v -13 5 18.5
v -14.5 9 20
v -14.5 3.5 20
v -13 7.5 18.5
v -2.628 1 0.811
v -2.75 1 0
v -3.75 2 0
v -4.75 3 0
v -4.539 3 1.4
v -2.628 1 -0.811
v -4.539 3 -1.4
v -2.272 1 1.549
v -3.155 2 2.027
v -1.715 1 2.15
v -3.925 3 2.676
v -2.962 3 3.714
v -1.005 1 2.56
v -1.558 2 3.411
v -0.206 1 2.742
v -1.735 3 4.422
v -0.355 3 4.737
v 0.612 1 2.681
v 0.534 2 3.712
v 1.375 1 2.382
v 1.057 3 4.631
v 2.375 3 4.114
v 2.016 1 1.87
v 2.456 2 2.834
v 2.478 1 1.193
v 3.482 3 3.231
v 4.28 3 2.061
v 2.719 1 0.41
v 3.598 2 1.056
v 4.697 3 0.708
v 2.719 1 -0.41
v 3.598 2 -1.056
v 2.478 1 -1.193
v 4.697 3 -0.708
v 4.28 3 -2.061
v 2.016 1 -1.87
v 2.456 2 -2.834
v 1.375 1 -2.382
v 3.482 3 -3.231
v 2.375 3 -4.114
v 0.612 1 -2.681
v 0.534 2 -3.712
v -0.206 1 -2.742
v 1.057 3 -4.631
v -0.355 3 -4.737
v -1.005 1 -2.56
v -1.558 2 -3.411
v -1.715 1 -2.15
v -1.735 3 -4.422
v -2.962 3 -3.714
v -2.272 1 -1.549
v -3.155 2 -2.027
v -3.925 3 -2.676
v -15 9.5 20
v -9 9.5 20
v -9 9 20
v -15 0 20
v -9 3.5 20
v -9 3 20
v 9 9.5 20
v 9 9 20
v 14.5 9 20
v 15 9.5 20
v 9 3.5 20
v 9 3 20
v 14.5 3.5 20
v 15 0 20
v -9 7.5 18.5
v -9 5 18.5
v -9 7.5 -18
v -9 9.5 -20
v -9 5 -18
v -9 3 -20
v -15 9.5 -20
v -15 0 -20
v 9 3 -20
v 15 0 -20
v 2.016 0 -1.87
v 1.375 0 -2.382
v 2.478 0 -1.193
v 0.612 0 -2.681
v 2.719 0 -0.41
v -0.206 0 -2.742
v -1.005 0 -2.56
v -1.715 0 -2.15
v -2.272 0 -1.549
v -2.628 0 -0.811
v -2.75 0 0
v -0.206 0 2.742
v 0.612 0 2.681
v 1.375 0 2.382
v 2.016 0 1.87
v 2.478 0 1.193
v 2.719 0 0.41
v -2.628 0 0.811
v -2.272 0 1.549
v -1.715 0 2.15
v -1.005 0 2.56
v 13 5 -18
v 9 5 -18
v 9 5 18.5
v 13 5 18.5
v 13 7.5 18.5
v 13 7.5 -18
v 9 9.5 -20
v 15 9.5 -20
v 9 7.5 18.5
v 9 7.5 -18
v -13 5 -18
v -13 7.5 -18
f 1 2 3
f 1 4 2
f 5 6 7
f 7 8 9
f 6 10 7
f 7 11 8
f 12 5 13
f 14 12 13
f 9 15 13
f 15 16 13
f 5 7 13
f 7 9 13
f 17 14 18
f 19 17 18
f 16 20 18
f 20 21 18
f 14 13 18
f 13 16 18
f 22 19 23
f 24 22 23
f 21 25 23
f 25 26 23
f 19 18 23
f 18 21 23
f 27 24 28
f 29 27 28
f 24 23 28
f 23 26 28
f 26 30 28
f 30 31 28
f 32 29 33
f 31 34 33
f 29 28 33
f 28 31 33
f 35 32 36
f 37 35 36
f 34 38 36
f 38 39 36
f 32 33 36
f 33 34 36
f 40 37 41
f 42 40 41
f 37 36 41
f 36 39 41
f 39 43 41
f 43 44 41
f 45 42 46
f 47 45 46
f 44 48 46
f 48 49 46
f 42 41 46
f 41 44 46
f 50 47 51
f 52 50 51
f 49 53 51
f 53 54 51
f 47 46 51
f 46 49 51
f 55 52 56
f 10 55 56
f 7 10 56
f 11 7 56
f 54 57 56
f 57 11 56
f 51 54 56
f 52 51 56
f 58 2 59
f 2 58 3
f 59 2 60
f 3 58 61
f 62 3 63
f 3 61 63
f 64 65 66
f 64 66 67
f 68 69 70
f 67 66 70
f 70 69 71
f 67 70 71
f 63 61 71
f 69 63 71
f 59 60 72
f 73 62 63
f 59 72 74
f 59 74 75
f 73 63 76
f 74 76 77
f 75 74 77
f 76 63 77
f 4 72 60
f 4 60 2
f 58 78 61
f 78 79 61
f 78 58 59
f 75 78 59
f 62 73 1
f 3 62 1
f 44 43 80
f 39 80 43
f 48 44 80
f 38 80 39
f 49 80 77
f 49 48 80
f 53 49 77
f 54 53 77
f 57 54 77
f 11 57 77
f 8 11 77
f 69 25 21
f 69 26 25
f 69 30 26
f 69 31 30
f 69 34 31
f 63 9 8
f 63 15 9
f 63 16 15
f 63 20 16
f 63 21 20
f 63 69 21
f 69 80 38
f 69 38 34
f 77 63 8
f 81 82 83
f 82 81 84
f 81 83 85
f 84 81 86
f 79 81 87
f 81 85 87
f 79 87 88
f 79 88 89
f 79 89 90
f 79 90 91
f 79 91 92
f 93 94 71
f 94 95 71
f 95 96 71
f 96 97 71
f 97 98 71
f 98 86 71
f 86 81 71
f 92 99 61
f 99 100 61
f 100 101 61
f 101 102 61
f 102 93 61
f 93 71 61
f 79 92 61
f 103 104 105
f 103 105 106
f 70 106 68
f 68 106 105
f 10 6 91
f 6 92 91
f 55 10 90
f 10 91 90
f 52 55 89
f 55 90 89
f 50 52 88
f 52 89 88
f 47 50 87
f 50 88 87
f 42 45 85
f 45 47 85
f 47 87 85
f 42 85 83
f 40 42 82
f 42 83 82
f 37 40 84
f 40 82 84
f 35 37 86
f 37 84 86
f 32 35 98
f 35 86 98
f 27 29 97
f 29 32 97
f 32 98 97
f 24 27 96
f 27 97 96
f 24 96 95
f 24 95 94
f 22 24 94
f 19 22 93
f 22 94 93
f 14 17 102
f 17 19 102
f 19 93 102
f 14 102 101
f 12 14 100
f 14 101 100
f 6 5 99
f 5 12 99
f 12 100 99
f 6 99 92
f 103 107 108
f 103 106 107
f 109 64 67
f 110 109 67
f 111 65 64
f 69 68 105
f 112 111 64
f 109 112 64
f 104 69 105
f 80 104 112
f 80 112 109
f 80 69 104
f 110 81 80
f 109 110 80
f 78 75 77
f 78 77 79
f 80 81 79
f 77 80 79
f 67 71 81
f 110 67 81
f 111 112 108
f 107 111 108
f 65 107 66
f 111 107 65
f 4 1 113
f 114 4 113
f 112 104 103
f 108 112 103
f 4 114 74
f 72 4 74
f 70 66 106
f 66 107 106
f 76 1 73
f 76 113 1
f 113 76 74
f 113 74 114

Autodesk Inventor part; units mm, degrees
ref_plane "YZ Plane" through (0, 0, 0) normal (1, 0, 0) x (0, 1, 0)
ref_plane "XZ Plane" through (0, 0, 0) normal (0, 1, 0) x (-1, 0, 0)
ref_plane "XY Plane" through (0, 0, 0) normal (0, 0, 1) x (1, 0, 0)
sketch "Sketch1" plane through (0, 0, 0) normal (0, 1, 0) x (-1, 0, 0)
  line L0 (15, 20) -> (-15, 20)
  line L1 (-15, 20) -> (-15, -20)
  line L2 (-15, -20) -> (15, -20)
  line L3 (15, -20) -> (15, 20)
  line L4 (15, 20) -> (-15, -20) construction
  line L5 (-15, 20) -> (15, -20) construction
  circle A0 centre (0, 0) radius 2.75
  dimension "d0" = 30
  dimension "d1" = 40
  dimension "d2" = 5.5
extrude "Extrusion1" add sketch "Sketch1" along normal blind 3
chamfer "Chamfer1" distance 2 angle 45 1 edges at (2.75, 3, 0)
sketch "Sketch2" plane through (0, 3, 0) normal (0, 1, 0) x (1, 0, 0)
  line L0 (-15, -20) -> (15, -20) projected
  line L1 (15, 20) -> (-15, 20) projected
  line L2 (-15, -20) -> (-9, -20)
  line L3 (-9, -20) -> (-9, 20)
  line L4 (-9, 20) -> (-15, 20)
  line L5 (-15, 20) -> (-15, -20)
  line L6 (15, -20) -> (15, 20) projected
  line L7 (15, -20) -> (9, -20)
  line L8 (9, -20) -> (9, 20)
  line L9 (9, 20) -> (15, 20)
  line L10 (15, 20) -> (15, -20)
  point P0 (0, 0)
  point P1 (9, 20)
  dimension "d8" = 6
  dimension "d9" = 6
extrude "Extrusion2" add sketch "Sketch2" along normal blind 2 contours L5 L1 L3 L0 | L8 L1 L6 L0
sketch "Sketch3" plane through (0, 5, 0) normal (0, 1, 0) x (1, 0, 0)
  line L0 (-15, -20) -> (-9, -20) projected
  line L1 (15, 20) -> (-15, 20) projected
  line L2 (-15, -20) -> (-13, -20)
  line L3 (-13, -20) -> (-13, 20)
  line L4 (-13, 20) -> (-15, 20)
  line L5 (-15, 20) -> (-15, -20)
  line L6 (15, -20) -> (13, -20)
  line L7 (13, -20) -> (13, 20)
  line L8 (13, 20) -> (15, 20)
  line L9 (15, 20) -> (15, -20)
  line L10 (15, -20) -> (15, 20) projected
  line L11 (-9, -20) -> (-9, 20) projected
  line L12 (-15, 20) -> (-9, 20)
  line L13 (-9, 20) -> (-9, 18)
  line L14 (-9, 18) -> (-15, 18)
  line L15 (-15, 18) -> (-15, 20)
  line L16 (9, 20) -> (9, -20) projected
  line L17 (15, 20) -> (9, 20)
  line L18 (9, 20) -> (9, 18)
  line L19 (9, 18) -> (15, 18)
  line L20 (15, 18) -> (15, 20)
  point P0 (0, 0)
  point P1 (13, 18)
  point P2 (-13, 18)
  dimension "d12" = 2
  dimension "d13" = 2
  dimension "d14" = 0
  dimension "d15" = 2
extrude "Extrusion3" add sketch "Sketch3" along normal blind 2.5 contours L5 L14 L3 L0 | L1 L7 L19 L16 | L5 L1 L3 L14 | L3 L1 L11 L14 | L1 L9 L19 L7 | L19 L9 L6 L7
sketch "Sketch4" plane through (0, 7.5, 0) normal (0, 1, 0) x (1, 0, 0)
  line L0 (-15, 20) -> (-15, -20) projected
  line L1 (15, 20) -> (-15, 20) projected
  line L2 (-15, -20) -> (-9, -20)
  line L3 (-9, -20) -> (-9, 20)
  line L4 (-9, 20) -> (-15, 20)
  line L5 (-15, 20) -> (-15, -20)
  line L6 (15, -20) -> (15, 20) projected
  line L7 (9, -20) -> (9, 20) projected
  line L8 (15, 20) -> (9, 20)
  line L9 (9, 20) -> (9, -20)
  line L10 (9, -20) -> (15, -20)
  line L11 (15, -20) -> (15, 20)
  line L12 (-9, 18) -> (-9, 20) projected
  point P0 (0, 0)
  dimension "d18" = 0
extrude "Extrusion4" add sketch "Sketch4" along normal blind 2
chamfer "Chamfer2" distance 1.5 angle 45 6 edges at (-13, 6.25, 20) (-11, 7.5, 20) (-11, 5, 20) (11, 5, 20) (13, 6.25, 20) (11, 7.5, 20)
properties part number "spodok_drazka"
